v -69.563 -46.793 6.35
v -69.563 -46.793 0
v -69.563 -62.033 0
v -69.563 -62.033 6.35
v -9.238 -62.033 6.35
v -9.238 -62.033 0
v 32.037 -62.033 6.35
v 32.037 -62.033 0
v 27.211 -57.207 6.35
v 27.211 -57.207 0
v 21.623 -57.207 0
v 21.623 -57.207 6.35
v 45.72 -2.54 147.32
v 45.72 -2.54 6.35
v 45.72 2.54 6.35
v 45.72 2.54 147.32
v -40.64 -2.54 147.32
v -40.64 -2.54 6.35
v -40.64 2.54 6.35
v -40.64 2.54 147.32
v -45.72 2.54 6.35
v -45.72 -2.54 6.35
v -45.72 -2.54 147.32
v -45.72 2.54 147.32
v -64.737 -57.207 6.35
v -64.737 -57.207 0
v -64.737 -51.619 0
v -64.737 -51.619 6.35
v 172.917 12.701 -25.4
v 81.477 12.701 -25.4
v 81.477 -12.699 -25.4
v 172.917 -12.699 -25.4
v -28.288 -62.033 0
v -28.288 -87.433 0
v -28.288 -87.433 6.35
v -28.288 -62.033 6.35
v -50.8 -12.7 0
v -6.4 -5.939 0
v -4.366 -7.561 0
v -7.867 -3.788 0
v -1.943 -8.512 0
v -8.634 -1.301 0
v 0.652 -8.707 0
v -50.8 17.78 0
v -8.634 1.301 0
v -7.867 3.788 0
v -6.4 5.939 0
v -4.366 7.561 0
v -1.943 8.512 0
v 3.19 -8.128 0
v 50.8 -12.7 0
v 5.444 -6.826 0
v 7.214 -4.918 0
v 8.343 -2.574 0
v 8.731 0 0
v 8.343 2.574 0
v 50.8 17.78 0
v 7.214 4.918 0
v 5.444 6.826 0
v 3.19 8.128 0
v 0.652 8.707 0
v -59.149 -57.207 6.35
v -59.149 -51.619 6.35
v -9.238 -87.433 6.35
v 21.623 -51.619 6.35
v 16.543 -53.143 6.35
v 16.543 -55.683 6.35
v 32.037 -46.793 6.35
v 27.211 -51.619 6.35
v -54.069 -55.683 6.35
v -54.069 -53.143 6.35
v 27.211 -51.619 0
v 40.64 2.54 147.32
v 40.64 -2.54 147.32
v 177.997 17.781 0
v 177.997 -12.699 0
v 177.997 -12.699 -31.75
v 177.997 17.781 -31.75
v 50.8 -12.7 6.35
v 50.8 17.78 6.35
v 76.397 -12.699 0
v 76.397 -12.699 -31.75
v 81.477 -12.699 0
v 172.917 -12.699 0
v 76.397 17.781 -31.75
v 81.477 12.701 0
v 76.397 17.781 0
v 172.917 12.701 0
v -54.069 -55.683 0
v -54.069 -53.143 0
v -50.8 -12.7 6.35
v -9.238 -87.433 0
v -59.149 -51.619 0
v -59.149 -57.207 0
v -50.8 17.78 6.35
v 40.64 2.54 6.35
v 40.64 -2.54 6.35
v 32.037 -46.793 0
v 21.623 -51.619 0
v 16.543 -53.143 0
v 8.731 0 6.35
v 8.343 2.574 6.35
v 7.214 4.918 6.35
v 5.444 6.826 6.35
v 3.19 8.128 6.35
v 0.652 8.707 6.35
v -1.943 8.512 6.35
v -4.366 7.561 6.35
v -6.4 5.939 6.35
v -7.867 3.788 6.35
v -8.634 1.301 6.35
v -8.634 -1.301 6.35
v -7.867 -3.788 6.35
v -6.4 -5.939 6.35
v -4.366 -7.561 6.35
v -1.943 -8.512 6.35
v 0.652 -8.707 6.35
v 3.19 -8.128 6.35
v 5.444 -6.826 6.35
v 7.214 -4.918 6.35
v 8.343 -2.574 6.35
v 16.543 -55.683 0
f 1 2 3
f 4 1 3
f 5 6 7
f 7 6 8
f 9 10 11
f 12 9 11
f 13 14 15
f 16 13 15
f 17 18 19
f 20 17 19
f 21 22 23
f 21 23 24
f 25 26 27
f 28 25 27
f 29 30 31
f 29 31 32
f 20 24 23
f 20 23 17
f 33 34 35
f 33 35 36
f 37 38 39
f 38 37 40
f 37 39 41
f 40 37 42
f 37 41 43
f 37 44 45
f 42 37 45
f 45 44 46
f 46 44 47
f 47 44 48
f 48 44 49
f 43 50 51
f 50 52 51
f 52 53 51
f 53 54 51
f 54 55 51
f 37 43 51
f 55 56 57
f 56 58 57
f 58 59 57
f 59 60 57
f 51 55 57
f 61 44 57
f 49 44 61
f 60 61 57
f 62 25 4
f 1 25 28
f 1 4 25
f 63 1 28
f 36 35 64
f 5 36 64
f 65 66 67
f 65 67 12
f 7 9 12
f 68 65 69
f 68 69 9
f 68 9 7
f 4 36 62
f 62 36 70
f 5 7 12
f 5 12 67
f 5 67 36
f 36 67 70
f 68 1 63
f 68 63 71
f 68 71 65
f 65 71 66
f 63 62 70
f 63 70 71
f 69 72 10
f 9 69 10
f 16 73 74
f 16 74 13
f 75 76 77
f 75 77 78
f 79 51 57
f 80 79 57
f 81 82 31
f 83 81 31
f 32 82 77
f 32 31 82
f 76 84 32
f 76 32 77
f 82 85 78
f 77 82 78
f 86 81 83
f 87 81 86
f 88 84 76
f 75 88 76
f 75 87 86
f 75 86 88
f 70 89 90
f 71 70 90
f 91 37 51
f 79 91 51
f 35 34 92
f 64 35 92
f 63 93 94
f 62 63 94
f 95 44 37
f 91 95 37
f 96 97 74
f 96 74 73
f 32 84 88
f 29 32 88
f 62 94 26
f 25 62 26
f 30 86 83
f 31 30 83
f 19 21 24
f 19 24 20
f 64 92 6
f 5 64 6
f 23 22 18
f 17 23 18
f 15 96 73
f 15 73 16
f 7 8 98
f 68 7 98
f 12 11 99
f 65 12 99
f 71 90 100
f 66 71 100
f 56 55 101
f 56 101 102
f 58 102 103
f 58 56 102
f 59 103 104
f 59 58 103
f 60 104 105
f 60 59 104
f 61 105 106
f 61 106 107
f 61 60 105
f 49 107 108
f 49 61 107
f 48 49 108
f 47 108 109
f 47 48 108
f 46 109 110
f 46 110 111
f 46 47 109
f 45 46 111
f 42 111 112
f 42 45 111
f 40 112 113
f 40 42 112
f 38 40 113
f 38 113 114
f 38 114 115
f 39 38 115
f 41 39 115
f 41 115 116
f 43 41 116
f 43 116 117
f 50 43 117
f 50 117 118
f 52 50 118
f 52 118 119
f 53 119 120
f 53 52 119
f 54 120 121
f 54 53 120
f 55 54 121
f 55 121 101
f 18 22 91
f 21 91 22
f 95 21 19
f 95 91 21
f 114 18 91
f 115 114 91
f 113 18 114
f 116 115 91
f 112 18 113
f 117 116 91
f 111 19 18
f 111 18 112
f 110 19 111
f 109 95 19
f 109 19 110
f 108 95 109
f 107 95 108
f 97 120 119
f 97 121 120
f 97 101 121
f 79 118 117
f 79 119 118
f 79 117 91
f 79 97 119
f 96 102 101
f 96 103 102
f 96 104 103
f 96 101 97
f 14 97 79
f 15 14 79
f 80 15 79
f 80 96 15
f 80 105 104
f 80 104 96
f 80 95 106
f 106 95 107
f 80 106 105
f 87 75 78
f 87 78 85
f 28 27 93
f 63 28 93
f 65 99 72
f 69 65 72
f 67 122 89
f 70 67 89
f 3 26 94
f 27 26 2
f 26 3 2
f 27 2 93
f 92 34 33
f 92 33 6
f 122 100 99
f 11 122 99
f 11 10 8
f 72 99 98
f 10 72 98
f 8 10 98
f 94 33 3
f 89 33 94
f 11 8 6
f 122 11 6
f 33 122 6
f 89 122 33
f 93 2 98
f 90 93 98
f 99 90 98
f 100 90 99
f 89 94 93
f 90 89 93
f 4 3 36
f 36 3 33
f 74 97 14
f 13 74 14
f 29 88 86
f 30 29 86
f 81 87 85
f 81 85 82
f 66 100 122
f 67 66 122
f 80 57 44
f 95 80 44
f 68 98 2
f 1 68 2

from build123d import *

# Parameters (mm, degrees)
F0_W     = 5.08
F0_H     = 5.08
F1_DEPTH = 147.32
F0_R     = 8.73125
F2_DEPTH = 6.35
F3_W     = 19.05
F3_H     = 25.4
F4_DEPTH = 6.35
F5_W     = 5.08
F5_H     = 5.08
F6_DEPTH = 31.75
F7_DEPTH = 25.4


# Not quite as in the source:
# - a feature names something its author has since deleted; it is built from what else it names


with BuildPart() as f1:
    # F0 (on Top) → F1 (new body)
    with BuildSketch(Plane.XY):
        with Locations((43.18, 0)):
            Rectangle(F0_W, F0_H)
    extrude(amount=F1_DEPTH)



with BuildPart() as f1b:
    # F0 (on Top) → F1, piece 2 (new body)
    with BuildSketch(Plane.XY):
        with Locations((-43.18, 0)):
            Rectangle(F0_W, F0_H)
    extrude(amount=F1_DEPTH)


with BuildPart() as f1_1:
    add(f1.part)

    add(f1b.part)  # F2 merges F1b
    # F0 (on Top) → F2 (join)
    with BuildSketch(Plane.XY):
        Polygon((45.72, 2.54), (45.72, 12.7), (-45.72, 12.7), (-45.72, 2.54), (-40.64, 2.54), (-40.64, -2.54), (-45.72, -2.54), (-45.72, -12.7), (45.72, -12.7), (45.72, -2.54), (40.64, -2.54), (40.64, 2.54), align=None)
        Circle(F0_R, mode=Mode.SUBTRACT)
        Polygon((-45.72, 12.7), (45.72, 12.7), (45.72, 2.54), (45.72, -2.54), (45.72, -12.7), (50.8, -12.7), (50.8, 17.78), (-50.8, 17.78), (-50.8, -12.7), (-45.72, -12.7), (-45.72, -2.54), (-45.72, 2.54), align=None)
    extrude(amount=F2_DEPTH)


with BuildPart() as f4:
    # F3 (on Top) → F4 (new body)
    with BuildSketch(Plane.XY):
        Polygon((-69.5630355358, -46.7925282216), (-69.5630355358, -62.0325282216), (-28.2880355358, -62.0325282216), (-9.2380355358, -62.0325282216), (32.0369644642, -62.0325282216), (32.0369644642, -46.7925282216), align=None)
        Polygon((-64.7370355358, -57.2065282216), (-64.7370355358, -51.6185282216), (-59.1490355358, -51.6185282216), (-54.0690355358, -51.6185282216), (-54.0690355358, -53.1425282216), (16.5429644642, -53.1425282216), (16.5429644642, -51.6185282216), (21.6229644642, -51.6185282216), (27.2109644642, -51.6185282216), (27.2109644642, -57.2065282216), (21.6229644642, -57.2065282216), (16.5429644642, -57.2065282216), (16.5429644642, -55.6825282216), (-54.0690355358, -55.6825282216), (-54.0690355358, -57.2065282216), (-59.1490355358, -57.2065282216), align=None, mode=Mode.SUBTRACT)
        with Locations((-18.7630355358, -74.7325282216)):
            Rectangle(F3_W, F3_H)
        Polygon((16.5429644642, -51.6185282216), (16.5429644642, -53.1425282216), (16.5429644642, -55.6825282216), (16.5429644642, -57.2065282216), (21.6229644642, -57.2065282216), (21.6229644642, -51.6185282216), align=None)
        Polygon((-54.0690355358, -51.6185282216), (-59.1490355358, -51.6185282216), (-59.1490355358, -57.2065282216), (-54.0690355358, -57.2065282216), (-54.0690355358, -55.6825282216), (-54.0690355358, -53.1425282216), align=None)
    extrude(amount=F4_DEPTH)


with BuildPart() as f6:
    # F5 (on Top) → F6 (new body)
    with BuildSketch(Plane.XY):
        Polygon((172.916882534, 2.5405777639), (172.916882534, 12.7005777639), (81.476882534, 12.7005777639), (81.476882534, 2.5405777639), (86.556882534, 2.5405777639), (86.556882534, -2.5394222361), (81.476882534, -2.5394222361), (81.476882534, -12.6994222361), (172.916882534, -12.6994222361), (172.916882534, -2.5394222361), (167.836882534, -2.5394222361), (167.836882534, 2.5405777639), align=None)
        Polygon((81.476882534, 12.7005777639), (172.916882534, 12.7005777639), (172.916882534, 2.5405777639), (172.916882534, -2.5394222361), (172.916882534, -12.6994222361), (177.996882534, -12.6994222361), (177.996882534, 17.7805777639), (76.396882534, 17.7805777639), (76.396882534, -12.6994222361), (81.476882534, -12.6994222361), (81.476882534, -2.5394222361), (81.476882534, 2.5405777639), align=None)
        with Locations((84.016882534, 0.0005777639)):
            Rectangle(F5_W, F5_H)
        with Locations((170.376882534, 0.0005777639)):
            Rectangle(F5_W, F5_H)
    extrude(amount=-F6_DEPTH)

    # F5 (on Top) → F7 (cut)
    with BuildSketch(Plane.XY):
        Polygon((172.916882534, 2.5405777639), (172.916882534, 12.7005777639), (81.476882534, 12.7005777639), (81.476882534, 2.5405777639), (86.556882534, 2.5405777639), (86.556882534, -2.5394222361), (81.476882534, -2.5394222361), (81.476882534, -12.6994222361), (172.916882534, -12.6994222361), (172.916882534, -2.5394222361), (167.836882534, -2.5394222361), (167.836882534, 2.5405777639), align=None)
        with Locations((170.376882534, 0.0005777639)):
            Rectangle(F5_W, F5_H)
        with Locations((84.016882534, 0.0005777639)):
            Rectangle(F5_W, F5_H)
    extrude(amount=-F7_DEPTH, mode=Mode.SUBTRACT)


solid = Compound([f1_1.part, f4.part, f6.part])
